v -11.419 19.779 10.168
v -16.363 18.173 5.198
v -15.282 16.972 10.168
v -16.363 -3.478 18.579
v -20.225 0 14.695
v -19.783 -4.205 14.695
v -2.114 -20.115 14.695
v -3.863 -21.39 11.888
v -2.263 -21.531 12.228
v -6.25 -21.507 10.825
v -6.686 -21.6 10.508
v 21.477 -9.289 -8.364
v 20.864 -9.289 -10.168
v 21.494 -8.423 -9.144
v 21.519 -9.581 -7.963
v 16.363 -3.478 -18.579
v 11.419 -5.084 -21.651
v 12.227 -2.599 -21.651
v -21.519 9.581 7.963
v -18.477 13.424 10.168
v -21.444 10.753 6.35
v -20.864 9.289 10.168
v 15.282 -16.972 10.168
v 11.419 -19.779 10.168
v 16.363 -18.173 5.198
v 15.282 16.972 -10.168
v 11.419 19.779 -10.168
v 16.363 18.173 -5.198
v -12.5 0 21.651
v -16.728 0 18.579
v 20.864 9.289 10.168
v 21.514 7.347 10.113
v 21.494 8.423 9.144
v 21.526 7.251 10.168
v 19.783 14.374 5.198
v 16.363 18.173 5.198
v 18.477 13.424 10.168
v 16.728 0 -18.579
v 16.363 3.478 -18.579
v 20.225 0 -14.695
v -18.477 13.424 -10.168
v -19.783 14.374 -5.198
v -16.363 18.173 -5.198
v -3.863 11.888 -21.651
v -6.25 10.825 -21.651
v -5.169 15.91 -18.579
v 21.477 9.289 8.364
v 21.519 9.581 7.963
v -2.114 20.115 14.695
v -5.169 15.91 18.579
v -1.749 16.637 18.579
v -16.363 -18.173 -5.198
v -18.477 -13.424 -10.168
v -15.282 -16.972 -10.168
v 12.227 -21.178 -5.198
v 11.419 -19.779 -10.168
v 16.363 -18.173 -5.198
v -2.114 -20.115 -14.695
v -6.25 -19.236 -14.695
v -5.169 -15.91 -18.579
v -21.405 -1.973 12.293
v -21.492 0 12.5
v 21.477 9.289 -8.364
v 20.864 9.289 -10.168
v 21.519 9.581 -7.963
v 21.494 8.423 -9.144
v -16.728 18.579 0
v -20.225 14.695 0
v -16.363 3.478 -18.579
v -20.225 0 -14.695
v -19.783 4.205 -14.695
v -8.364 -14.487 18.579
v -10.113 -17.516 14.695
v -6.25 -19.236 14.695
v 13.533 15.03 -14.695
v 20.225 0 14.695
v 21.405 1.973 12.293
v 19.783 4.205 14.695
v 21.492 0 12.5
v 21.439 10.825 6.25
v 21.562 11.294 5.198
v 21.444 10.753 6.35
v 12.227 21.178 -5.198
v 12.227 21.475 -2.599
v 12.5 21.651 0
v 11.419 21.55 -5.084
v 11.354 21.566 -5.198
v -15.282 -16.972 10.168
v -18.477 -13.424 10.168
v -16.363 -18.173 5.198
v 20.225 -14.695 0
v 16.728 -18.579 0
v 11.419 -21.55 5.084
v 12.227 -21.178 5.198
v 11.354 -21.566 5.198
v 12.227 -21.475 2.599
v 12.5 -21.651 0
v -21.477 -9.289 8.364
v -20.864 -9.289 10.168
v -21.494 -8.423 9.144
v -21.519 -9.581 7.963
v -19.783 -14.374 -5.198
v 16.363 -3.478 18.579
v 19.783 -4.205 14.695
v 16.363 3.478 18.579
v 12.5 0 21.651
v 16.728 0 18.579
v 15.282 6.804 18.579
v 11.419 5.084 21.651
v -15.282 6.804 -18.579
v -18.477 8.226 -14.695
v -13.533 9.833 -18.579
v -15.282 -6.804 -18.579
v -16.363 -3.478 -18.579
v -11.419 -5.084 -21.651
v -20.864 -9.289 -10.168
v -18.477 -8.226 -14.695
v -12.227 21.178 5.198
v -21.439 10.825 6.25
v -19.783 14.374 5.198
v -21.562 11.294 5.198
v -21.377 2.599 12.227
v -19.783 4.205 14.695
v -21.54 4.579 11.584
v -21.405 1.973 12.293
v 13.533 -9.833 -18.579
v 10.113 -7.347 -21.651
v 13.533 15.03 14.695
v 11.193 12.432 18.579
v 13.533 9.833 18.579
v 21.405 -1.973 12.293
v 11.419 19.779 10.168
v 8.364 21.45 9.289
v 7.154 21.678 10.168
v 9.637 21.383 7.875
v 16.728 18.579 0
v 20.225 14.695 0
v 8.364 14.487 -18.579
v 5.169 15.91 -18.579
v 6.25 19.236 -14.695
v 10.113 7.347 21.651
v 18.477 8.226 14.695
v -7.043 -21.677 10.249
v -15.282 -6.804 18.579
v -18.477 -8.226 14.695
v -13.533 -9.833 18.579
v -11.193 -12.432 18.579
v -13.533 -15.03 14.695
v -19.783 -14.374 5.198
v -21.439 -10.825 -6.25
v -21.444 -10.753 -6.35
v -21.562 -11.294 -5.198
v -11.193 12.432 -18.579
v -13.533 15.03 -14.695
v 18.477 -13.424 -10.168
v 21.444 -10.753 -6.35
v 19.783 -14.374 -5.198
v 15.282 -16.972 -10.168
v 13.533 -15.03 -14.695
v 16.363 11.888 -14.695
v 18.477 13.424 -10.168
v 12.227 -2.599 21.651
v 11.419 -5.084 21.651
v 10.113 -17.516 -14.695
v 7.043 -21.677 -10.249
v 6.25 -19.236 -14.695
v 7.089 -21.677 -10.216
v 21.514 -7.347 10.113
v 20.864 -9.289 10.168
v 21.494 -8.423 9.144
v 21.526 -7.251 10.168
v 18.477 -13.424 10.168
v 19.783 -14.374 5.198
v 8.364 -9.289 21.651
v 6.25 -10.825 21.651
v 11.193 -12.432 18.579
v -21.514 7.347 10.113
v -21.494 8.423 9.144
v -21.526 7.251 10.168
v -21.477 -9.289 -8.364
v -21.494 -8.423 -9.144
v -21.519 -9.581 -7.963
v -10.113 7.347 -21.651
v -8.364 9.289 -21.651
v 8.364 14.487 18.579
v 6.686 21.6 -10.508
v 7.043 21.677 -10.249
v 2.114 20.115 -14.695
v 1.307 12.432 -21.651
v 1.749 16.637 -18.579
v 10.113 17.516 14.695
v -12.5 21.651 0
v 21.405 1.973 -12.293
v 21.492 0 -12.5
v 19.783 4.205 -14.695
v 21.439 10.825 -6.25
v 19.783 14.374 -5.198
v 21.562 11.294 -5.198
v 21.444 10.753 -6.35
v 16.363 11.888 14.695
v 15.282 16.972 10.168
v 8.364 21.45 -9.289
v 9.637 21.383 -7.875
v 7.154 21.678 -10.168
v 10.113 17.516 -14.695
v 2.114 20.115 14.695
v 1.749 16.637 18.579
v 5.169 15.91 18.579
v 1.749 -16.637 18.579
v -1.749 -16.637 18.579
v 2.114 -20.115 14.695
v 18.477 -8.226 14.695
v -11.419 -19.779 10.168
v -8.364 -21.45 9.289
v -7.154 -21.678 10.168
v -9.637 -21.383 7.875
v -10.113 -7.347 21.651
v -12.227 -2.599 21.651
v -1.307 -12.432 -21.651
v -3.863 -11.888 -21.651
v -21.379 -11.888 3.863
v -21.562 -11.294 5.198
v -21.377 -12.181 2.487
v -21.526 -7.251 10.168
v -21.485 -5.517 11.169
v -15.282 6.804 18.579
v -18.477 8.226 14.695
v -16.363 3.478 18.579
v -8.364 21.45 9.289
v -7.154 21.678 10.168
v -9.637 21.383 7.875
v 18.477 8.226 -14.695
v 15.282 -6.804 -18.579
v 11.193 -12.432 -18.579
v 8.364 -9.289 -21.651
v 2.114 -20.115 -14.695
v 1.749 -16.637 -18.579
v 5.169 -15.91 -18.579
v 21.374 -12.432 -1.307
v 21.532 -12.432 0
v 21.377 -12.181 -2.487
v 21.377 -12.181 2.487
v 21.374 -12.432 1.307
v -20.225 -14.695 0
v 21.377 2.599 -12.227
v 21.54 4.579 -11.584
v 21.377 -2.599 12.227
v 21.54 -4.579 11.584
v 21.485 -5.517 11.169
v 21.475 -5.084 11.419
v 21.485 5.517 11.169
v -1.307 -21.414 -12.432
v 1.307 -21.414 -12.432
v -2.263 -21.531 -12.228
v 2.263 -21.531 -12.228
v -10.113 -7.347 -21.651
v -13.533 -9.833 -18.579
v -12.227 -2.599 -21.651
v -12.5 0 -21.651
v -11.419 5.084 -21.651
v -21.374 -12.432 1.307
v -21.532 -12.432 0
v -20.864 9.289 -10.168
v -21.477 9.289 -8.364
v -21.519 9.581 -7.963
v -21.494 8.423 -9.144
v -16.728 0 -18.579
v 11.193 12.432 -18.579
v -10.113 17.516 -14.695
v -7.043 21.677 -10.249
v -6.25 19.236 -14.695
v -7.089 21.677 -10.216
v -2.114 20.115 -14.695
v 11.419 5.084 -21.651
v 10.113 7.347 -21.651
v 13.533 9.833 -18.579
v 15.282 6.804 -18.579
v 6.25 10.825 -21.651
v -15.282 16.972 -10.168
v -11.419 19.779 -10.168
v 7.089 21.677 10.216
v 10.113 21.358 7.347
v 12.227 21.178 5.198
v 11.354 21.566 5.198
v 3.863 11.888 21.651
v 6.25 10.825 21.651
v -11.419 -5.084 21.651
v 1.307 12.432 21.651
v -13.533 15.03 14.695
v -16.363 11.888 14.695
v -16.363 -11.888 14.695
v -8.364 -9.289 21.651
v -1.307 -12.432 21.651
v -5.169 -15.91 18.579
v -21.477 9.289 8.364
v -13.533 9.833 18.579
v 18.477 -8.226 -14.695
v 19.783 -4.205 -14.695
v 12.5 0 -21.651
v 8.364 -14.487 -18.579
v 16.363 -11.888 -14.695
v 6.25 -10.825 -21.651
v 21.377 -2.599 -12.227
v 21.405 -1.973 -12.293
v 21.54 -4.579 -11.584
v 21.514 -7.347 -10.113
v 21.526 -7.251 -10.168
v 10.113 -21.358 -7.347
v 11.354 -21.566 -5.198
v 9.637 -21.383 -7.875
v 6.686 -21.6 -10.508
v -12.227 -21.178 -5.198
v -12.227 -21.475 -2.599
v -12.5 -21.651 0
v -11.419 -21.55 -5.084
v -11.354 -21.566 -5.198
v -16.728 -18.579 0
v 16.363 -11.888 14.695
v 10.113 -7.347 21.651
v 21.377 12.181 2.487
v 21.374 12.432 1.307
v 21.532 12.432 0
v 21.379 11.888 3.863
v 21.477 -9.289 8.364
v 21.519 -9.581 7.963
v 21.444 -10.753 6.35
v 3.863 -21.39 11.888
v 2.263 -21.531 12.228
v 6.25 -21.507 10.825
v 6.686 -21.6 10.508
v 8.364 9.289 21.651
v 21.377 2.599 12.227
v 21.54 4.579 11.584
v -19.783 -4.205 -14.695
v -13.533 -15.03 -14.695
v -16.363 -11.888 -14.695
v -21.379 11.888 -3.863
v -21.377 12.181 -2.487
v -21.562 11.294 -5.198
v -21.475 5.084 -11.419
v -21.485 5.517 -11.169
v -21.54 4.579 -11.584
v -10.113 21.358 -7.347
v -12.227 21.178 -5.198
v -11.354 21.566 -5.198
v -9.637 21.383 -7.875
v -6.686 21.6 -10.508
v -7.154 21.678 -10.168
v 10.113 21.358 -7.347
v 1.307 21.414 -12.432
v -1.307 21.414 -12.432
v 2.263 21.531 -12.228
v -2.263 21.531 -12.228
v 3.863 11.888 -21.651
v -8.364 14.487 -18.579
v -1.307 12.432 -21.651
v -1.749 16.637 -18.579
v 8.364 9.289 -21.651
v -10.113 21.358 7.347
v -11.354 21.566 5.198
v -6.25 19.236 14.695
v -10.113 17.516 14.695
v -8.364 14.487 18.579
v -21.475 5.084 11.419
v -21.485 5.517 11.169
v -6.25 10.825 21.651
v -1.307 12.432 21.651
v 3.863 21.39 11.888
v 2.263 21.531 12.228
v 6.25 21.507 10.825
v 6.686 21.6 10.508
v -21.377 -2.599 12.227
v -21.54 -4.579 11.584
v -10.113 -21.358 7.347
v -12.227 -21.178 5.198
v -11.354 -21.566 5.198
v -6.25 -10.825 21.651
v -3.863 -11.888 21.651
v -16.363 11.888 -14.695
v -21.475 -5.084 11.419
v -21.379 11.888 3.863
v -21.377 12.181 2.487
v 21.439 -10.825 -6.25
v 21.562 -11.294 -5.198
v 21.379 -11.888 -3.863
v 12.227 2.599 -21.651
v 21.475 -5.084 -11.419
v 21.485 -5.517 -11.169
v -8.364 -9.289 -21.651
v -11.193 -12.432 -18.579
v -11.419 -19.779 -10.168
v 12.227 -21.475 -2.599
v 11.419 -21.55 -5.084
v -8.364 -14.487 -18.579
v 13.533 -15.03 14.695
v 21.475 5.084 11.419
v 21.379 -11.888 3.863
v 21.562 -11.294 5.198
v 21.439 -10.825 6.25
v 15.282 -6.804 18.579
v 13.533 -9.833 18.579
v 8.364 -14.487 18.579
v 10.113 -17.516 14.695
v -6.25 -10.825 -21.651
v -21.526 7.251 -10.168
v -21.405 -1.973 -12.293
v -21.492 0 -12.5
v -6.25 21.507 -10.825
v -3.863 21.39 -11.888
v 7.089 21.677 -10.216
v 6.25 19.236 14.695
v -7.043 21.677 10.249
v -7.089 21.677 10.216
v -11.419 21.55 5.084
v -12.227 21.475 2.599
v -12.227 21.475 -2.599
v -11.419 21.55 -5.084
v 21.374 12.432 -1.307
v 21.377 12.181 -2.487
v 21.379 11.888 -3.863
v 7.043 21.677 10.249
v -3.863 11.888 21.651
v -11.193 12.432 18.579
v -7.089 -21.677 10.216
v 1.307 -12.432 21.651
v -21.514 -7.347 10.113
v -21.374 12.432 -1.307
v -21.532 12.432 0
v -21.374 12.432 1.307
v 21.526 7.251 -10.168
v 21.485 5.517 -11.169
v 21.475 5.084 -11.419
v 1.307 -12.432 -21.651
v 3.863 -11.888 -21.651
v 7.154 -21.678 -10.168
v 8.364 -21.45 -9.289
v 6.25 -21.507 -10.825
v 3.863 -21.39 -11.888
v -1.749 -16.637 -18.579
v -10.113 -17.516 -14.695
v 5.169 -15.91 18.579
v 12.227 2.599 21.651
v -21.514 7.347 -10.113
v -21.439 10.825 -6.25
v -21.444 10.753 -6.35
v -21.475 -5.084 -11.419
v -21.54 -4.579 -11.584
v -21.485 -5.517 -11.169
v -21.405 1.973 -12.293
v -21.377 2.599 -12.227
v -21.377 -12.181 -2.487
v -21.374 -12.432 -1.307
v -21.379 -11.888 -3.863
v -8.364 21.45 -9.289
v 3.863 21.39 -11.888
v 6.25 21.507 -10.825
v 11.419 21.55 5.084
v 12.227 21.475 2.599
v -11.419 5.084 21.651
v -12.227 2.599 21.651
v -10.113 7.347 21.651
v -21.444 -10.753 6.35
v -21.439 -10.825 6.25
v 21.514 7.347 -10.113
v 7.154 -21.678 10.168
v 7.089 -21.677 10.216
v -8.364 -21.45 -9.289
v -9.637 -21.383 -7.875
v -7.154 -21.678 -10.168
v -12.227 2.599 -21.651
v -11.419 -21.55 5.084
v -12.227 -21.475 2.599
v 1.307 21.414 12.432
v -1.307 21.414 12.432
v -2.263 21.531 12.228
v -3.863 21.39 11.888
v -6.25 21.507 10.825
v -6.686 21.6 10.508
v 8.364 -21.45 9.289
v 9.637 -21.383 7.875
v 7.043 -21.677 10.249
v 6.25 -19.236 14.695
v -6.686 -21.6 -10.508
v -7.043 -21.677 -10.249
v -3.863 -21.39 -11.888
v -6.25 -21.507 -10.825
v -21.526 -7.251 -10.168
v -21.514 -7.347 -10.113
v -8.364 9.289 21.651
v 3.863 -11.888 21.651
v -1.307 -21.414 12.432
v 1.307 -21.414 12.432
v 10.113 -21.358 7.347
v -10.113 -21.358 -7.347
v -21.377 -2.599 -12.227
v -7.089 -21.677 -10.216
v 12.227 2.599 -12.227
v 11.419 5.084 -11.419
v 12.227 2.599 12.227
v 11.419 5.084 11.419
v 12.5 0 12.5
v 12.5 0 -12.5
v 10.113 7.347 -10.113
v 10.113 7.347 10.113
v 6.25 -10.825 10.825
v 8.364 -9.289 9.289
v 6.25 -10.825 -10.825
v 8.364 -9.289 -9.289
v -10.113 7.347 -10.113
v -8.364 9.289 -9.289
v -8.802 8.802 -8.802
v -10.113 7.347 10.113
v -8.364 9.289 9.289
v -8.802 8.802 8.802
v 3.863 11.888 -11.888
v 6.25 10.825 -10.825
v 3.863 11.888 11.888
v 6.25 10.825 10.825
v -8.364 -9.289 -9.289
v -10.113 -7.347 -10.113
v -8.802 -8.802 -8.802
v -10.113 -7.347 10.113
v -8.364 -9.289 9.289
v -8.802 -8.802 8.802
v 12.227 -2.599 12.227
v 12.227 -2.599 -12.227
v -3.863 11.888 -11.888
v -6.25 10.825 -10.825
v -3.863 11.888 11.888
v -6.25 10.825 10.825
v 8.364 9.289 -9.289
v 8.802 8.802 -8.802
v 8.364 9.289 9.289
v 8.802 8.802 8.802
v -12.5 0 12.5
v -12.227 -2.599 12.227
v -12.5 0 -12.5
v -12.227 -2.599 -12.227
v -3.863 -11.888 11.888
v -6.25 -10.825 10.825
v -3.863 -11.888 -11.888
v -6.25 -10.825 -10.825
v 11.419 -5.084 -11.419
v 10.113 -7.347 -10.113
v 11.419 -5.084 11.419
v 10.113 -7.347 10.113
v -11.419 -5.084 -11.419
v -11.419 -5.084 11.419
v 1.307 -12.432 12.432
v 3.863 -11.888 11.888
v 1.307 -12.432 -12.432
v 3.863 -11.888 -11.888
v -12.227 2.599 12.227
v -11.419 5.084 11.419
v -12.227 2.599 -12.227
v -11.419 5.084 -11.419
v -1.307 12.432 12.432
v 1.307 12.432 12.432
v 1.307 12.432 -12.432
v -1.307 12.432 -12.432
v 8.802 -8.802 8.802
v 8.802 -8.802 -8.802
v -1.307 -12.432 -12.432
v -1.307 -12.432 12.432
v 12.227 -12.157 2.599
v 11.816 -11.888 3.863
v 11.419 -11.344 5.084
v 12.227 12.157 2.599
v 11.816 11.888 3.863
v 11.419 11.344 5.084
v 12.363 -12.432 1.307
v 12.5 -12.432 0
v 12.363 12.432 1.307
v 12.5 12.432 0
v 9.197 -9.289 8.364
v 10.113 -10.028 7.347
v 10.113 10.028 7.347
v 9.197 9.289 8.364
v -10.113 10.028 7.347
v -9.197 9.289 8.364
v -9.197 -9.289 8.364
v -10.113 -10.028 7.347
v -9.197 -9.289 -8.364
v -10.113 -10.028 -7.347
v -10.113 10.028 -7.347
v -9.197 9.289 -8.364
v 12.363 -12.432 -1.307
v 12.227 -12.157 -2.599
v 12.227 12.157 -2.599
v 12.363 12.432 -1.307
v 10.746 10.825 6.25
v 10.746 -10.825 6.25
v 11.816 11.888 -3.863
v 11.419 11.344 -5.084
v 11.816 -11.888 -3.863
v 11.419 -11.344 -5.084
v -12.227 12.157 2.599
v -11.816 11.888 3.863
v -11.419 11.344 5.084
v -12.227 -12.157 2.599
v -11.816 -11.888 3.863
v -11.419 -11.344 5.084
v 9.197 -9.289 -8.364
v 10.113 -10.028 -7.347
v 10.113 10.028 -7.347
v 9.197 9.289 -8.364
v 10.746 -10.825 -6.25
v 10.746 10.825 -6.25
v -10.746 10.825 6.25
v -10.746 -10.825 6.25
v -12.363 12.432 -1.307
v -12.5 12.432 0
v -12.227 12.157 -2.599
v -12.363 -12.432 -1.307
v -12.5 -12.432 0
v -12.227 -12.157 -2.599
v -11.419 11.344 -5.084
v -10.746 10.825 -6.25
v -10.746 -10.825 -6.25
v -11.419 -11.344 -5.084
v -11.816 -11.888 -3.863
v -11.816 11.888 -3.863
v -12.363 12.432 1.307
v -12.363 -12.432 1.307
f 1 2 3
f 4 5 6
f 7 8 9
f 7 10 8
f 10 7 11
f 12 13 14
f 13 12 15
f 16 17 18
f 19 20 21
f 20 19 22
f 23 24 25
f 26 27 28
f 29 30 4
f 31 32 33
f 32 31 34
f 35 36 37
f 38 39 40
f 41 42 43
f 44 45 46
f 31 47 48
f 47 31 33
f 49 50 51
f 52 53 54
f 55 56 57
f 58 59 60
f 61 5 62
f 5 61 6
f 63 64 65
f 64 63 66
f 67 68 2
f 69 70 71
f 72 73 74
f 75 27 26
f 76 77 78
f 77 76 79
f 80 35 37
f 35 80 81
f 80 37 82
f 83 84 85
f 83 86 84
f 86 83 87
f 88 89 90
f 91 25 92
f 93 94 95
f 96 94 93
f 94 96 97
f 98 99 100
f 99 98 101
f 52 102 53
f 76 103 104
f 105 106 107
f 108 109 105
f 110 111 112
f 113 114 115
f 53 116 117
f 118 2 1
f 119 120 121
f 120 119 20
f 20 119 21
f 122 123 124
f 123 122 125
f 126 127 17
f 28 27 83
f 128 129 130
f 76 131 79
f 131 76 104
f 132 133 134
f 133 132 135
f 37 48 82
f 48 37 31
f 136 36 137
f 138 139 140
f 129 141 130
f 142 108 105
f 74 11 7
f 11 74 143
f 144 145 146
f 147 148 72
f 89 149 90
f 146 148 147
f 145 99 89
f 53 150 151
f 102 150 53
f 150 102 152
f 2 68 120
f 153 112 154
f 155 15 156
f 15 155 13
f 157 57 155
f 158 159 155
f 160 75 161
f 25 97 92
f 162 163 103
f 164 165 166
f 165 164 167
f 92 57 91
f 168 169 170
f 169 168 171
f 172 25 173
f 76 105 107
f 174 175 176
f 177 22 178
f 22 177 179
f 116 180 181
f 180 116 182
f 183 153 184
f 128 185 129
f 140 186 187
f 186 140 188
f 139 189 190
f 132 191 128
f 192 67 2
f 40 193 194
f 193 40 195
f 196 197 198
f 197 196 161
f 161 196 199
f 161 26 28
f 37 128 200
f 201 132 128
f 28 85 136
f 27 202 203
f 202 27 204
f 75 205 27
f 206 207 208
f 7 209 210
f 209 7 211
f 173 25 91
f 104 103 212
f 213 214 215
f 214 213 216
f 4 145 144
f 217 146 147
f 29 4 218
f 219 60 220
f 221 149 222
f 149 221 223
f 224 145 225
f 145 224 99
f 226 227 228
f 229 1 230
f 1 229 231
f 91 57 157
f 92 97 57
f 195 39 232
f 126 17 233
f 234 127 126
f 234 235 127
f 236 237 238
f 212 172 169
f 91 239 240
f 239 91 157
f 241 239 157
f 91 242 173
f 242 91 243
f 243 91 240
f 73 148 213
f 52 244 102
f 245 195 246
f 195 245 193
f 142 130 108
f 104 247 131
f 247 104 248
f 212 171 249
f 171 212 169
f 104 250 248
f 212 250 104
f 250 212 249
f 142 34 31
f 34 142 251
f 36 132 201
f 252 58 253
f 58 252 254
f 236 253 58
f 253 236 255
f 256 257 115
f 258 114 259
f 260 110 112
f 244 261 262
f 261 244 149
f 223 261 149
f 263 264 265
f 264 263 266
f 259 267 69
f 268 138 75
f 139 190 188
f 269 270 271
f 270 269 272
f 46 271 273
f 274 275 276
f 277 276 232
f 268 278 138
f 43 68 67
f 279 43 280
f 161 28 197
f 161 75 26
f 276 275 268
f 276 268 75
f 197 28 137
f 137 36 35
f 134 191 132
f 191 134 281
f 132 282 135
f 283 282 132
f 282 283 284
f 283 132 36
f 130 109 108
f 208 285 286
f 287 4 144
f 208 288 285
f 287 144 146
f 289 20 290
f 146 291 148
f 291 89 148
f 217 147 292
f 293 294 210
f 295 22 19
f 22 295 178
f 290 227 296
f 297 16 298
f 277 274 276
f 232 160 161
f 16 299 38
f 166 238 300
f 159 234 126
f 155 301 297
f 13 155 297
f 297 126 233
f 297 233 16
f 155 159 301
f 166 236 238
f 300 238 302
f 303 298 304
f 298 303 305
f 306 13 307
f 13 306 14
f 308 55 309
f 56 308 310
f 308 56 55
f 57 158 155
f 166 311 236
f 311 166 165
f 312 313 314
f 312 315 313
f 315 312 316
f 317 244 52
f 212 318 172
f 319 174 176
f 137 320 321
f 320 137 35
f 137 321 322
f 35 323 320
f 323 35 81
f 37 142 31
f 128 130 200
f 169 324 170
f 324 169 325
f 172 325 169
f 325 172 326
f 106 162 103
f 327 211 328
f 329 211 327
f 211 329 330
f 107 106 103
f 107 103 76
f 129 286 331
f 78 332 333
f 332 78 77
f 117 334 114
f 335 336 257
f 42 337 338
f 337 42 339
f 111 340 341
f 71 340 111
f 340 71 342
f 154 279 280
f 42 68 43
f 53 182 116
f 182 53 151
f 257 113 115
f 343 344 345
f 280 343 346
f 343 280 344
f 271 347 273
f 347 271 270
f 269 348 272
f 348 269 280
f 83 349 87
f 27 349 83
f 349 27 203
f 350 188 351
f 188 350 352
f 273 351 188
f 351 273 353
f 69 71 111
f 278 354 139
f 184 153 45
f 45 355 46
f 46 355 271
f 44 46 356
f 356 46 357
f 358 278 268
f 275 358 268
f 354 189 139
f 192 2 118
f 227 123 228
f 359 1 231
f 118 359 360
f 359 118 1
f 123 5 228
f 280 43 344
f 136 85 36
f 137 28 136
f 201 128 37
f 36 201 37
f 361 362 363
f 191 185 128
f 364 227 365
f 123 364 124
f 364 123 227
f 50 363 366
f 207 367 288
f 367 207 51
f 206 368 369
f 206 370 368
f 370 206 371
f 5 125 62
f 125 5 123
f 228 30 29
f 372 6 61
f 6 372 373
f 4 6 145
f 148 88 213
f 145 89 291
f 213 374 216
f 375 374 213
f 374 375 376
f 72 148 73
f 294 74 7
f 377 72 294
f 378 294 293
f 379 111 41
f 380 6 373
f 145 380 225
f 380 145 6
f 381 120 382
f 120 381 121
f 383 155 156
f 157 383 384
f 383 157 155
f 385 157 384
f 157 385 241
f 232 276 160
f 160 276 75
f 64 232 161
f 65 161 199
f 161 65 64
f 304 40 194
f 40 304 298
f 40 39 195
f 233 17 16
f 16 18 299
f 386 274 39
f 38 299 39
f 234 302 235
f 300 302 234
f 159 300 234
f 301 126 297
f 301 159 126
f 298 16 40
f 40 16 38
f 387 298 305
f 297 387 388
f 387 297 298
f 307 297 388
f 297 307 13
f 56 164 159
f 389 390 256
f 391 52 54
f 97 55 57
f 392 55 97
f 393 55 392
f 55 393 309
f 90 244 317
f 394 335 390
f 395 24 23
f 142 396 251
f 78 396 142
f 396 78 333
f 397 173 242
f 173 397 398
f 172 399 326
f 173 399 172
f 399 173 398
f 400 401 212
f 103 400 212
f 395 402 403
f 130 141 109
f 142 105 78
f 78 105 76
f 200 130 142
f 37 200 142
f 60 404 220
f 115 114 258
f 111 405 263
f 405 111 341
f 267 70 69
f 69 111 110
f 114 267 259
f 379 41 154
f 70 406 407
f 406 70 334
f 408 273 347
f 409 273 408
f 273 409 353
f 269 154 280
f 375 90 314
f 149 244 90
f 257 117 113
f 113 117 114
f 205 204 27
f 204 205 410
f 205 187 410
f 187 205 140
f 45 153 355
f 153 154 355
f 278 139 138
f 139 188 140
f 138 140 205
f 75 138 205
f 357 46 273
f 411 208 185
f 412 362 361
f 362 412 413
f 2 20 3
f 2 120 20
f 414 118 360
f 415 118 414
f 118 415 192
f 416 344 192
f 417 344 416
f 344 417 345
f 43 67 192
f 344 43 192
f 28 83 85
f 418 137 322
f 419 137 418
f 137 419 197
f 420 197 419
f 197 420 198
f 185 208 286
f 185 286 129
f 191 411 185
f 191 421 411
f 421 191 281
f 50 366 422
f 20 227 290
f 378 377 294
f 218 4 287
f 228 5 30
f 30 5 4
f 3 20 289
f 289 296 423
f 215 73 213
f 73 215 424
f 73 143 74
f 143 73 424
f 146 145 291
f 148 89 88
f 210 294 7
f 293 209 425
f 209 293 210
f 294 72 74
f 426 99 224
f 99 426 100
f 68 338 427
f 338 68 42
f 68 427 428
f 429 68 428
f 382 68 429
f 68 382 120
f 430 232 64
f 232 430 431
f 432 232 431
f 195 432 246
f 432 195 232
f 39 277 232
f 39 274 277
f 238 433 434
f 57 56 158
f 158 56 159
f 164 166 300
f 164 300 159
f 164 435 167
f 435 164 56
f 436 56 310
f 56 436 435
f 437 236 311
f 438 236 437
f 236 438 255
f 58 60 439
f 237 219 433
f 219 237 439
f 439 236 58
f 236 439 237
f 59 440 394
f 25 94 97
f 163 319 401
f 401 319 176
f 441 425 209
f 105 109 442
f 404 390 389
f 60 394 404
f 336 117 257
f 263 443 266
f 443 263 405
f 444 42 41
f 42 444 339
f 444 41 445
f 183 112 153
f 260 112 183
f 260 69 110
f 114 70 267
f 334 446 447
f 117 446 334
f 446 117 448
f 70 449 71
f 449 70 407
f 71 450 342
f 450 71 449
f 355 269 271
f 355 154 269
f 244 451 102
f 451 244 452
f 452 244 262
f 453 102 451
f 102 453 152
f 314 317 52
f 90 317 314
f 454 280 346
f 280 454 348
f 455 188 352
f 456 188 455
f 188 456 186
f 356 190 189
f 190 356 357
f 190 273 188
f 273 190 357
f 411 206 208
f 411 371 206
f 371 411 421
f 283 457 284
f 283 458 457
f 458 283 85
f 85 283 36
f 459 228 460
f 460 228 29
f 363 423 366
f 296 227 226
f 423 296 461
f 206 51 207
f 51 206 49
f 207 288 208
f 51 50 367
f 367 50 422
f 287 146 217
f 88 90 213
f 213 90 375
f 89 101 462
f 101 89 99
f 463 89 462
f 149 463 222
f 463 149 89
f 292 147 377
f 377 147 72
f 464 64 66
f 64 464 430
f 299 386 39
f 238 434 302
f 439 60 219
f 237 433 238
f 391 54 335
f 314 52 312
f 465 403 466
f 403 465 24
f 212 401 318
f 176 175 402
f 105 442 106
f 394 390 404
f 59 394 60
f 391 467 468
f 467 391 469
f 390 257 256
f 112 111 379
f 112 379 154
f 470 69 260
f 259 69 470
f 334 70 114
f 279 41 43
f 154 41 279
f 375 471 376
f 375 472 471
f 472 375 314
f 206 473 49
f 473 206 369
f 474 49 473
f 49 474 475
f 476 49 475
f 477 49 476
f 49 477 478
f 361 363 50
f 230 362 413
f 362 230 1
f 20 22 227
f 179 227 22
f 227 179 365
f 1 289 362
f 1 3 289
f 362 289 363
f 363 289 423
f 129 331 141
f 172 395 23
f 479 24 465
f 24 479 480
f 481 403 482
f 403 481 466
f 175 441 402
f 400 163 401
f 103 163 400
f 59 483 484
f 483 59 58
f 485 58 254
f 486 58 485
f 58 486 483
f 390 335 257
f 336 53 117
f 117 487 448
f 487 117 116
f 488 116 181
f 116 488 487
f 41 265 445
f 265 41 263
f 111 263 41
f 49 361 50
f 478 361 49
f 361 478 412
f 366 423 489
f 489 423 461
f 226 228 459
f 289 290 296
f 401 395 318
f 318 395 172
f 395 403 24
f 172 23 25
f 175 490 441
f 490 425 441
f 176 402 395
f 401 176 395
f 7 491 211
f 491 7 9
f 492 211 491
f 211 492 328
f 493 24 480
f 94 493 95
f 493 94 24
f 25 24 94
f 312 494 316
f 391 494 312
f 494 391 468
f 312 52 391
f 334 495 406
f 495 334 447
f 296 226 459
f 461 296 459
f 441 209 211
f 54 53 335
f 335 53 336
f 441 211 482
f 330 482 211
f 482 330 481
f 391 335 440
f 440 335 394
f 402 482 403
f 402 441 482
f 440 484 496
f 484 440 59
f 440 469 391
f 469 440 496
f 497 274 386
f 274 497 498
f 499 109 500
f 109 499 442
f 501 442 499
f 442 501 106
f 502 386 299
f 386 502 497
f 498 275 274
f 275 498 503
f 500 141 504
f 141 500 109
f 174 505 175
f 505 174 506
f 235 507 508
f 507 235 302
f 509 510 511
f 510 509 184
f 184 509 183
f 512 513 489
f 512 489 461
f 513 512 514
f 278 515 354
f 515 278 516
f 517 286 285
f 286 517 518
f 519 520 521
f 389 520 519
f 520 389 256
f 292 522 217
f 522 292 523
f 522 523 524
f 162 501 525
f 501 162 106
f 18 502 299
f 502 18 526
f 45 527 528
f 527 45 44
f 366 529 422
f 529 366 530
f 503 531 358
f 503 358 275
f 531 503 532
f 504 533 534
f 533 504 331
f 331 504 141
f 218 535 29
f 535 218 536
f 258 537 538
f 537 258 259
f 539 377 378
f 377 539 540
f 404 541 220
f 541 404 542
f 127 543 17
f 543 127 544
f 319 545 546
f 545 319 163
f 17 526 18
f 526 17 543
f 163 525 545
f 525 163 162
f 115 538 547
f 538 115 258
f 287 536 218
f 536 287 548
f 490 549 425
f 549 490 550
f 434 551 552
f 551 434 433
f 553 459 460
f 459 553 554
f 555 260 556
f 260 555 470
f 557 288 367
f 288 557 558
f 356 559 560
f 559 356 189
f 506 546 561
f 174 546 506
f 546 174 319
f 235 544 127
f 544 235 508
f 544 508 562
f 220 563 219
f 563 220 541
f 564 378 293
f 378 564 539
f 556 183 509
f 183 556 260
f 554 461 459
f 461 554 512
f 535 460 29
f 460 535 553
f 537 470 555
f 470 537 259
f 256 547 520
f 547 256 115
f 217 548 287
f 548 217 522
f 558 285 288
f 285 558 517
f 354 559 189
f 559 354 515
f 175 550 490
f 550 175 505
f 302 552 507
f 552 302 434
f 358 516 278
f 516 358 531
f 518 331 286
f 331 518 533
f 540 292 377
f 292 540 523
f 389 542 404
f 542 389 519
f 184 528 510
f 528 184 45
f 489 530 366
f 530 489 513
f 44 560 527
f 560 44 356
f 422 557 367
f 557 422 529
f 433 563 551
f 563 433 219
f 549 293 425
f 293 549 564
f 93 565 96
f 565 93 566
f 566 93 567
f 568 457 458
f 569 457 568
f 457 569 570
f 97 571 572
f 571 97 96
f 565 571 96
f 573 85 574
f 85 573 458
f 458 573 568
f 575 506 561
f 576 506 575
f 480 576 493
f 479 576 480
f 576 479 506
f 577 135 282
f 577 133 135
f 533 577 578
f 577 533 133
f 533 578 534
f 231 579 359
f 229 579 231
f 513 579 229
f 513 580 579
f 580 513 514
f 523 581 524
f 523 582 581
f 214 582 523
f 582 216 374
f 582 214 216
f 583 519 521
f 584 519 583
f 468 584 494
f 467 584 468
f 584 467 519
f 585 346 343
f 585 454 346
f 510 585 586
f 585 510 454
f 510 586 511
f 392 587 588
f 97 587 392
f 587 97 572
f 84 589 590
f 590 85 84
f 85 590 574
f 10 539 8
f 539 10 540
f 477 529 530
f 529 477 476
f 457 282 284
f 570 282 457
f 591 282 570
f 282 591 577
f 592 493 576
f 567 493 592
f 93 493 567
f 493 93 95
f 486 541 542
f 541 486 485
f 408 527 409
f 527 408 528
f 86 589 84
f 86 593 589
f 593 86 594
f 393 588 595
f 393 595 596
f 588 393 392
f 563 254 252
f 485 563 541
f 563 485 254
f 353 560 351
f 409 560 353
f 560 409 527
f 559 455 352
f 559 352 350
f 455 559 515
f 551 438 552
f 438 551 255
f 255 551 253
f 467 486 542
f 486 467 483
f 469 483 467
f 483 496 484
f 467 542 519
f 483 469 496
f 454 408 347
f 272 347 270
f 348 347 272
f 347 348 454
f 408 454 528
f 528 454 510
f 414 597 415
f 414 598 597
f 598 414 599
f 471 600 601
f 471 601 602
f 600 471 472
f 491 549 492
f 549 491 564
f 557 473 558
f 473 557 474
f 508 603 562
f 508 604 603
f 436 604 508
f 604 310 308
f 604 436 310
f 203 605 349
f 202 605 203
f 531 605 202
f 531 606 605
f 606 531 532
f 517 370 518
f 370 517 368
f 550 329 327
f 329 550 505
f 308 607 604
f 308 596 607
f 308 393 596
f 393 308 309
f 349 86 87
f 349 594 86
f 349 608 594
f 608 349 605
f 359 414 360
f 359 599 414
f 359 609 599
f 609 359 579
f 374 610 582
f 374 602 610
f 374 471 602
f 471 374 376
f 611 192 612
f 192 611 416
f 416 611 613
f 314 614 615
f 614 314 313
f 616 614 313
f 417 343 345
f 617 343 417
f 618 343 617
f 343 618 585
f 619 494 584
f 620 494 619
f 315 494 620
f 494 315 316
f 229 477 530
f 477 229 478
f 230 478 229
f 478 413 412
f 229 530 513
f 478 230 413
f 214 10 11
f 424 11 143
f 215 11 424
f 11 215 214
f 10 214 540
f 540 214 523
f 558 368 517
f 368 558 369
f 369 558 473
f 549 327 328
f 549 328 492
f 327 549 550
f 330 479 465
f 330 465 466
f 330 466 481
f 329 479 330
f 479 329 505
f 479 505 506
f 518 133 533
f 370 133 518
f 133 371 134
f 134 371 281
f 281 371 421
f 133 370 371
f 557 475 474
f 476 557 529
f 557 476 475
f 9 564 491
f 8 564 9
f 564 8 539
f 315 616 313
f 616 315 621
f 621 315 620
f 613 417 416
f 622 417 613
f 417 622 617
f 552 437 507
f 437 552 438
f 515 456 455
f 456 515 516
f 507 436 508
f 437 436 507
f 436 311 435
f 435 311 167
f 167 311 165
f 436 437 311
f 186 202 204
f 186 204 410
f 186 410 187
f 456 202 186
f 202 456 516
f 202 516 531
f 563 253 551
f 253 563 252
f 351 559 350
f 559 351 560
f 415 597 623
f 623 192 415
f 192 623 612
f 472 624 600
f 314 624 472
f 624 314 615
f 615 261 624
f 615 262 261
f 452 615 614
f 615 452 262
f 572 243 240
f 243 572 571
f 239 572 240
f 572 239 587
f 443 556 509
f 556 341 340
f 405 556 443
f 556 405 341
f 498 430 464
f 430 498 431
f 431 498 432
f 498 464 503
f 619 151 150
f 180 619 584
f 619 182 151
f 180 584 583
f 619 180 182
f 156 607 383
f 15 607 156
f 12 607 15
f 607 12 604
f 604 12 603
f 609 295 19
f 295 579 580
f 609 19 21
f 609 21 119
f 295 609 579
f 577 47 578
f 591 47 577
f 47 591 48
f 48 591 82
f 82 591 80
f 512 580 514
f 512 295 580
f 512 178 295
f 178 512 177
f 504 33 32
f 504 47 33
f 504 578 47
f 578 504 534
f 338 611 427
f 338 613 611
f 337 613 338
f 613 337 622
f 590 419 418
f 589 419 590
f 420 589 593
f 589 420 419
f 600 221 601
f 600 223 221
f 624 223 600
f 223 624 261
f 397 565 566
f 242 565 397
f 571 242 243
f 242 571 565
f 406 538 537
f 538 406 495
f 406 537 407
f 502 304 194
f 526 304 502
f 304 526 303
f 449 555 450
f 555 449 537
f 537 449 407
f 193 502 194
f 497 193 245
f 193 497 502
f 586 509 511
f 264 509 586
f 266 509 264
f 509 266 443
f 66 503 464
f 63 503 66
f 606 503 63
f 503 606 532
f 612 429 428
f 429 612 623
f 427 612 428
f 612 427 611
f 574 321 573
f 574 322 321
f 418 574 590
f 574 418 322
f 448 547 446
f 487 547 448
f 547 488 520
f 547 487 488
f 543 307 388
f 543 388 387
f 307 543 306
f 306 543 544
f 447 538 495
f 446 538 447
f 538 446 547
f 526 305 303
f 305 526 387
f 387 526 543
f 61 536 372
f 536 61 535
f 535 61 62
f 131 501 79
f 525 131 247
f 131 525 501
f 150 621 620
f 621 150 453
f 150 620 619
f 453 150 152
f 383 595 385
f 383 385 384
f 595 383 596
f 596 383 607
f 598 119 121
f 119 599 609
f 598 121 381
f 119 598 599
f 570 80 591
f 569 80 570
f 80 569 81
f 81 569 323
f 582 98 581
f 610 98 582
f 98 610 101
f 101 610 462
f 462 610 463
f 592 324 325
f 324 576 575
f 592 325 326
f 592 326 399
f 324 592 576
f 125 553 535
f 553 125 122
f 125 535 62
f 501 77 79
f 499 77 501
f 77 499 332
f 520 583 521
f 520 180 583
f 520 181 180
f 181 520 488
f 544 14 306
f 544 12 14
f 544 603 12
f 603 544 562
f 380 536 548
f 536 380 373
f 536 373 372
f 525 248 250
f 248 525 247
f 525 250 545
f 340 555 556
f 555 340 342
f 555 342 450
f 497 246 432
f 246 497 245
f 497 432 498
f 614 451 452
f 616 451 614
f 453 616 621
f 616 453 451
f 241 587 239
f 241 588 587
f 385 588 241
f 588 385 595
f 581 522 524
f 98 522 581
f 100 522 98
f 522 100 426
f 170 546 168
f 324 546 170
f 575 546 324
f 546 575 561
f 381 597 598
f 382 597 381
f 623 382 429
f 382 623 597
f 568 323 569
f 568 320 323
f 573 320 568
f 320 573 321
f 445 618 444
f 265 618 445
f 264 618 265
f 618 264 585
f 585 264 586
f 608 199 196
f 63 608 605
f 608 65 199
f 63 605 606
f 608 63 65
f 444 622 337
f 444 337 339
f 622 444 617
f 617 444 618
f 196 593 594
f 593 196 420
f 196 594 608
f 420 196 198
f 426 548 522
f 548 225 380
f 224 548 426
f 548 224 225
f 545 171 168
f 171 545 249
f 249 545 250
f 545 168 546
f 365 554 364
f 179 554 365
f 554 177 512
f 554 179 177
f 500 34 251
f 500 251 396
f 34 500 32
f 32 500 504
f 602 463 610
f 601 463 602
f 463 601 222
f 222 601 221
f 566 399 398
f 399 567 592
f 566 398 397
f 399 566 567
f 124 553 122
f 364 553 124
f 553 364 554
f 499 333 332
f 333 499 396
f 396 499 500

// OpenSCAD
module example001()
{
  function r_from_dia(d) = d / 2;

  module rotcy(rot, r, h) {
    rotate(90, rot)
      cylinder(r = r, h = h, center = true);
  }

  difference() {
    sphere(r = r_from_dia(size));
    rotcy([0, 0, 0], cy_r, cy_h);
    rotcy([1, 0, 0], cy_r, cy_h);
    rotcy([0, 1, 0], cy_r, cy_h);
  }

  size = 50;
  hole = 25;

  cy_r = r_from_dia(hole);
  cy_h = r_from_dia(size * 2.5);
}

example001();
